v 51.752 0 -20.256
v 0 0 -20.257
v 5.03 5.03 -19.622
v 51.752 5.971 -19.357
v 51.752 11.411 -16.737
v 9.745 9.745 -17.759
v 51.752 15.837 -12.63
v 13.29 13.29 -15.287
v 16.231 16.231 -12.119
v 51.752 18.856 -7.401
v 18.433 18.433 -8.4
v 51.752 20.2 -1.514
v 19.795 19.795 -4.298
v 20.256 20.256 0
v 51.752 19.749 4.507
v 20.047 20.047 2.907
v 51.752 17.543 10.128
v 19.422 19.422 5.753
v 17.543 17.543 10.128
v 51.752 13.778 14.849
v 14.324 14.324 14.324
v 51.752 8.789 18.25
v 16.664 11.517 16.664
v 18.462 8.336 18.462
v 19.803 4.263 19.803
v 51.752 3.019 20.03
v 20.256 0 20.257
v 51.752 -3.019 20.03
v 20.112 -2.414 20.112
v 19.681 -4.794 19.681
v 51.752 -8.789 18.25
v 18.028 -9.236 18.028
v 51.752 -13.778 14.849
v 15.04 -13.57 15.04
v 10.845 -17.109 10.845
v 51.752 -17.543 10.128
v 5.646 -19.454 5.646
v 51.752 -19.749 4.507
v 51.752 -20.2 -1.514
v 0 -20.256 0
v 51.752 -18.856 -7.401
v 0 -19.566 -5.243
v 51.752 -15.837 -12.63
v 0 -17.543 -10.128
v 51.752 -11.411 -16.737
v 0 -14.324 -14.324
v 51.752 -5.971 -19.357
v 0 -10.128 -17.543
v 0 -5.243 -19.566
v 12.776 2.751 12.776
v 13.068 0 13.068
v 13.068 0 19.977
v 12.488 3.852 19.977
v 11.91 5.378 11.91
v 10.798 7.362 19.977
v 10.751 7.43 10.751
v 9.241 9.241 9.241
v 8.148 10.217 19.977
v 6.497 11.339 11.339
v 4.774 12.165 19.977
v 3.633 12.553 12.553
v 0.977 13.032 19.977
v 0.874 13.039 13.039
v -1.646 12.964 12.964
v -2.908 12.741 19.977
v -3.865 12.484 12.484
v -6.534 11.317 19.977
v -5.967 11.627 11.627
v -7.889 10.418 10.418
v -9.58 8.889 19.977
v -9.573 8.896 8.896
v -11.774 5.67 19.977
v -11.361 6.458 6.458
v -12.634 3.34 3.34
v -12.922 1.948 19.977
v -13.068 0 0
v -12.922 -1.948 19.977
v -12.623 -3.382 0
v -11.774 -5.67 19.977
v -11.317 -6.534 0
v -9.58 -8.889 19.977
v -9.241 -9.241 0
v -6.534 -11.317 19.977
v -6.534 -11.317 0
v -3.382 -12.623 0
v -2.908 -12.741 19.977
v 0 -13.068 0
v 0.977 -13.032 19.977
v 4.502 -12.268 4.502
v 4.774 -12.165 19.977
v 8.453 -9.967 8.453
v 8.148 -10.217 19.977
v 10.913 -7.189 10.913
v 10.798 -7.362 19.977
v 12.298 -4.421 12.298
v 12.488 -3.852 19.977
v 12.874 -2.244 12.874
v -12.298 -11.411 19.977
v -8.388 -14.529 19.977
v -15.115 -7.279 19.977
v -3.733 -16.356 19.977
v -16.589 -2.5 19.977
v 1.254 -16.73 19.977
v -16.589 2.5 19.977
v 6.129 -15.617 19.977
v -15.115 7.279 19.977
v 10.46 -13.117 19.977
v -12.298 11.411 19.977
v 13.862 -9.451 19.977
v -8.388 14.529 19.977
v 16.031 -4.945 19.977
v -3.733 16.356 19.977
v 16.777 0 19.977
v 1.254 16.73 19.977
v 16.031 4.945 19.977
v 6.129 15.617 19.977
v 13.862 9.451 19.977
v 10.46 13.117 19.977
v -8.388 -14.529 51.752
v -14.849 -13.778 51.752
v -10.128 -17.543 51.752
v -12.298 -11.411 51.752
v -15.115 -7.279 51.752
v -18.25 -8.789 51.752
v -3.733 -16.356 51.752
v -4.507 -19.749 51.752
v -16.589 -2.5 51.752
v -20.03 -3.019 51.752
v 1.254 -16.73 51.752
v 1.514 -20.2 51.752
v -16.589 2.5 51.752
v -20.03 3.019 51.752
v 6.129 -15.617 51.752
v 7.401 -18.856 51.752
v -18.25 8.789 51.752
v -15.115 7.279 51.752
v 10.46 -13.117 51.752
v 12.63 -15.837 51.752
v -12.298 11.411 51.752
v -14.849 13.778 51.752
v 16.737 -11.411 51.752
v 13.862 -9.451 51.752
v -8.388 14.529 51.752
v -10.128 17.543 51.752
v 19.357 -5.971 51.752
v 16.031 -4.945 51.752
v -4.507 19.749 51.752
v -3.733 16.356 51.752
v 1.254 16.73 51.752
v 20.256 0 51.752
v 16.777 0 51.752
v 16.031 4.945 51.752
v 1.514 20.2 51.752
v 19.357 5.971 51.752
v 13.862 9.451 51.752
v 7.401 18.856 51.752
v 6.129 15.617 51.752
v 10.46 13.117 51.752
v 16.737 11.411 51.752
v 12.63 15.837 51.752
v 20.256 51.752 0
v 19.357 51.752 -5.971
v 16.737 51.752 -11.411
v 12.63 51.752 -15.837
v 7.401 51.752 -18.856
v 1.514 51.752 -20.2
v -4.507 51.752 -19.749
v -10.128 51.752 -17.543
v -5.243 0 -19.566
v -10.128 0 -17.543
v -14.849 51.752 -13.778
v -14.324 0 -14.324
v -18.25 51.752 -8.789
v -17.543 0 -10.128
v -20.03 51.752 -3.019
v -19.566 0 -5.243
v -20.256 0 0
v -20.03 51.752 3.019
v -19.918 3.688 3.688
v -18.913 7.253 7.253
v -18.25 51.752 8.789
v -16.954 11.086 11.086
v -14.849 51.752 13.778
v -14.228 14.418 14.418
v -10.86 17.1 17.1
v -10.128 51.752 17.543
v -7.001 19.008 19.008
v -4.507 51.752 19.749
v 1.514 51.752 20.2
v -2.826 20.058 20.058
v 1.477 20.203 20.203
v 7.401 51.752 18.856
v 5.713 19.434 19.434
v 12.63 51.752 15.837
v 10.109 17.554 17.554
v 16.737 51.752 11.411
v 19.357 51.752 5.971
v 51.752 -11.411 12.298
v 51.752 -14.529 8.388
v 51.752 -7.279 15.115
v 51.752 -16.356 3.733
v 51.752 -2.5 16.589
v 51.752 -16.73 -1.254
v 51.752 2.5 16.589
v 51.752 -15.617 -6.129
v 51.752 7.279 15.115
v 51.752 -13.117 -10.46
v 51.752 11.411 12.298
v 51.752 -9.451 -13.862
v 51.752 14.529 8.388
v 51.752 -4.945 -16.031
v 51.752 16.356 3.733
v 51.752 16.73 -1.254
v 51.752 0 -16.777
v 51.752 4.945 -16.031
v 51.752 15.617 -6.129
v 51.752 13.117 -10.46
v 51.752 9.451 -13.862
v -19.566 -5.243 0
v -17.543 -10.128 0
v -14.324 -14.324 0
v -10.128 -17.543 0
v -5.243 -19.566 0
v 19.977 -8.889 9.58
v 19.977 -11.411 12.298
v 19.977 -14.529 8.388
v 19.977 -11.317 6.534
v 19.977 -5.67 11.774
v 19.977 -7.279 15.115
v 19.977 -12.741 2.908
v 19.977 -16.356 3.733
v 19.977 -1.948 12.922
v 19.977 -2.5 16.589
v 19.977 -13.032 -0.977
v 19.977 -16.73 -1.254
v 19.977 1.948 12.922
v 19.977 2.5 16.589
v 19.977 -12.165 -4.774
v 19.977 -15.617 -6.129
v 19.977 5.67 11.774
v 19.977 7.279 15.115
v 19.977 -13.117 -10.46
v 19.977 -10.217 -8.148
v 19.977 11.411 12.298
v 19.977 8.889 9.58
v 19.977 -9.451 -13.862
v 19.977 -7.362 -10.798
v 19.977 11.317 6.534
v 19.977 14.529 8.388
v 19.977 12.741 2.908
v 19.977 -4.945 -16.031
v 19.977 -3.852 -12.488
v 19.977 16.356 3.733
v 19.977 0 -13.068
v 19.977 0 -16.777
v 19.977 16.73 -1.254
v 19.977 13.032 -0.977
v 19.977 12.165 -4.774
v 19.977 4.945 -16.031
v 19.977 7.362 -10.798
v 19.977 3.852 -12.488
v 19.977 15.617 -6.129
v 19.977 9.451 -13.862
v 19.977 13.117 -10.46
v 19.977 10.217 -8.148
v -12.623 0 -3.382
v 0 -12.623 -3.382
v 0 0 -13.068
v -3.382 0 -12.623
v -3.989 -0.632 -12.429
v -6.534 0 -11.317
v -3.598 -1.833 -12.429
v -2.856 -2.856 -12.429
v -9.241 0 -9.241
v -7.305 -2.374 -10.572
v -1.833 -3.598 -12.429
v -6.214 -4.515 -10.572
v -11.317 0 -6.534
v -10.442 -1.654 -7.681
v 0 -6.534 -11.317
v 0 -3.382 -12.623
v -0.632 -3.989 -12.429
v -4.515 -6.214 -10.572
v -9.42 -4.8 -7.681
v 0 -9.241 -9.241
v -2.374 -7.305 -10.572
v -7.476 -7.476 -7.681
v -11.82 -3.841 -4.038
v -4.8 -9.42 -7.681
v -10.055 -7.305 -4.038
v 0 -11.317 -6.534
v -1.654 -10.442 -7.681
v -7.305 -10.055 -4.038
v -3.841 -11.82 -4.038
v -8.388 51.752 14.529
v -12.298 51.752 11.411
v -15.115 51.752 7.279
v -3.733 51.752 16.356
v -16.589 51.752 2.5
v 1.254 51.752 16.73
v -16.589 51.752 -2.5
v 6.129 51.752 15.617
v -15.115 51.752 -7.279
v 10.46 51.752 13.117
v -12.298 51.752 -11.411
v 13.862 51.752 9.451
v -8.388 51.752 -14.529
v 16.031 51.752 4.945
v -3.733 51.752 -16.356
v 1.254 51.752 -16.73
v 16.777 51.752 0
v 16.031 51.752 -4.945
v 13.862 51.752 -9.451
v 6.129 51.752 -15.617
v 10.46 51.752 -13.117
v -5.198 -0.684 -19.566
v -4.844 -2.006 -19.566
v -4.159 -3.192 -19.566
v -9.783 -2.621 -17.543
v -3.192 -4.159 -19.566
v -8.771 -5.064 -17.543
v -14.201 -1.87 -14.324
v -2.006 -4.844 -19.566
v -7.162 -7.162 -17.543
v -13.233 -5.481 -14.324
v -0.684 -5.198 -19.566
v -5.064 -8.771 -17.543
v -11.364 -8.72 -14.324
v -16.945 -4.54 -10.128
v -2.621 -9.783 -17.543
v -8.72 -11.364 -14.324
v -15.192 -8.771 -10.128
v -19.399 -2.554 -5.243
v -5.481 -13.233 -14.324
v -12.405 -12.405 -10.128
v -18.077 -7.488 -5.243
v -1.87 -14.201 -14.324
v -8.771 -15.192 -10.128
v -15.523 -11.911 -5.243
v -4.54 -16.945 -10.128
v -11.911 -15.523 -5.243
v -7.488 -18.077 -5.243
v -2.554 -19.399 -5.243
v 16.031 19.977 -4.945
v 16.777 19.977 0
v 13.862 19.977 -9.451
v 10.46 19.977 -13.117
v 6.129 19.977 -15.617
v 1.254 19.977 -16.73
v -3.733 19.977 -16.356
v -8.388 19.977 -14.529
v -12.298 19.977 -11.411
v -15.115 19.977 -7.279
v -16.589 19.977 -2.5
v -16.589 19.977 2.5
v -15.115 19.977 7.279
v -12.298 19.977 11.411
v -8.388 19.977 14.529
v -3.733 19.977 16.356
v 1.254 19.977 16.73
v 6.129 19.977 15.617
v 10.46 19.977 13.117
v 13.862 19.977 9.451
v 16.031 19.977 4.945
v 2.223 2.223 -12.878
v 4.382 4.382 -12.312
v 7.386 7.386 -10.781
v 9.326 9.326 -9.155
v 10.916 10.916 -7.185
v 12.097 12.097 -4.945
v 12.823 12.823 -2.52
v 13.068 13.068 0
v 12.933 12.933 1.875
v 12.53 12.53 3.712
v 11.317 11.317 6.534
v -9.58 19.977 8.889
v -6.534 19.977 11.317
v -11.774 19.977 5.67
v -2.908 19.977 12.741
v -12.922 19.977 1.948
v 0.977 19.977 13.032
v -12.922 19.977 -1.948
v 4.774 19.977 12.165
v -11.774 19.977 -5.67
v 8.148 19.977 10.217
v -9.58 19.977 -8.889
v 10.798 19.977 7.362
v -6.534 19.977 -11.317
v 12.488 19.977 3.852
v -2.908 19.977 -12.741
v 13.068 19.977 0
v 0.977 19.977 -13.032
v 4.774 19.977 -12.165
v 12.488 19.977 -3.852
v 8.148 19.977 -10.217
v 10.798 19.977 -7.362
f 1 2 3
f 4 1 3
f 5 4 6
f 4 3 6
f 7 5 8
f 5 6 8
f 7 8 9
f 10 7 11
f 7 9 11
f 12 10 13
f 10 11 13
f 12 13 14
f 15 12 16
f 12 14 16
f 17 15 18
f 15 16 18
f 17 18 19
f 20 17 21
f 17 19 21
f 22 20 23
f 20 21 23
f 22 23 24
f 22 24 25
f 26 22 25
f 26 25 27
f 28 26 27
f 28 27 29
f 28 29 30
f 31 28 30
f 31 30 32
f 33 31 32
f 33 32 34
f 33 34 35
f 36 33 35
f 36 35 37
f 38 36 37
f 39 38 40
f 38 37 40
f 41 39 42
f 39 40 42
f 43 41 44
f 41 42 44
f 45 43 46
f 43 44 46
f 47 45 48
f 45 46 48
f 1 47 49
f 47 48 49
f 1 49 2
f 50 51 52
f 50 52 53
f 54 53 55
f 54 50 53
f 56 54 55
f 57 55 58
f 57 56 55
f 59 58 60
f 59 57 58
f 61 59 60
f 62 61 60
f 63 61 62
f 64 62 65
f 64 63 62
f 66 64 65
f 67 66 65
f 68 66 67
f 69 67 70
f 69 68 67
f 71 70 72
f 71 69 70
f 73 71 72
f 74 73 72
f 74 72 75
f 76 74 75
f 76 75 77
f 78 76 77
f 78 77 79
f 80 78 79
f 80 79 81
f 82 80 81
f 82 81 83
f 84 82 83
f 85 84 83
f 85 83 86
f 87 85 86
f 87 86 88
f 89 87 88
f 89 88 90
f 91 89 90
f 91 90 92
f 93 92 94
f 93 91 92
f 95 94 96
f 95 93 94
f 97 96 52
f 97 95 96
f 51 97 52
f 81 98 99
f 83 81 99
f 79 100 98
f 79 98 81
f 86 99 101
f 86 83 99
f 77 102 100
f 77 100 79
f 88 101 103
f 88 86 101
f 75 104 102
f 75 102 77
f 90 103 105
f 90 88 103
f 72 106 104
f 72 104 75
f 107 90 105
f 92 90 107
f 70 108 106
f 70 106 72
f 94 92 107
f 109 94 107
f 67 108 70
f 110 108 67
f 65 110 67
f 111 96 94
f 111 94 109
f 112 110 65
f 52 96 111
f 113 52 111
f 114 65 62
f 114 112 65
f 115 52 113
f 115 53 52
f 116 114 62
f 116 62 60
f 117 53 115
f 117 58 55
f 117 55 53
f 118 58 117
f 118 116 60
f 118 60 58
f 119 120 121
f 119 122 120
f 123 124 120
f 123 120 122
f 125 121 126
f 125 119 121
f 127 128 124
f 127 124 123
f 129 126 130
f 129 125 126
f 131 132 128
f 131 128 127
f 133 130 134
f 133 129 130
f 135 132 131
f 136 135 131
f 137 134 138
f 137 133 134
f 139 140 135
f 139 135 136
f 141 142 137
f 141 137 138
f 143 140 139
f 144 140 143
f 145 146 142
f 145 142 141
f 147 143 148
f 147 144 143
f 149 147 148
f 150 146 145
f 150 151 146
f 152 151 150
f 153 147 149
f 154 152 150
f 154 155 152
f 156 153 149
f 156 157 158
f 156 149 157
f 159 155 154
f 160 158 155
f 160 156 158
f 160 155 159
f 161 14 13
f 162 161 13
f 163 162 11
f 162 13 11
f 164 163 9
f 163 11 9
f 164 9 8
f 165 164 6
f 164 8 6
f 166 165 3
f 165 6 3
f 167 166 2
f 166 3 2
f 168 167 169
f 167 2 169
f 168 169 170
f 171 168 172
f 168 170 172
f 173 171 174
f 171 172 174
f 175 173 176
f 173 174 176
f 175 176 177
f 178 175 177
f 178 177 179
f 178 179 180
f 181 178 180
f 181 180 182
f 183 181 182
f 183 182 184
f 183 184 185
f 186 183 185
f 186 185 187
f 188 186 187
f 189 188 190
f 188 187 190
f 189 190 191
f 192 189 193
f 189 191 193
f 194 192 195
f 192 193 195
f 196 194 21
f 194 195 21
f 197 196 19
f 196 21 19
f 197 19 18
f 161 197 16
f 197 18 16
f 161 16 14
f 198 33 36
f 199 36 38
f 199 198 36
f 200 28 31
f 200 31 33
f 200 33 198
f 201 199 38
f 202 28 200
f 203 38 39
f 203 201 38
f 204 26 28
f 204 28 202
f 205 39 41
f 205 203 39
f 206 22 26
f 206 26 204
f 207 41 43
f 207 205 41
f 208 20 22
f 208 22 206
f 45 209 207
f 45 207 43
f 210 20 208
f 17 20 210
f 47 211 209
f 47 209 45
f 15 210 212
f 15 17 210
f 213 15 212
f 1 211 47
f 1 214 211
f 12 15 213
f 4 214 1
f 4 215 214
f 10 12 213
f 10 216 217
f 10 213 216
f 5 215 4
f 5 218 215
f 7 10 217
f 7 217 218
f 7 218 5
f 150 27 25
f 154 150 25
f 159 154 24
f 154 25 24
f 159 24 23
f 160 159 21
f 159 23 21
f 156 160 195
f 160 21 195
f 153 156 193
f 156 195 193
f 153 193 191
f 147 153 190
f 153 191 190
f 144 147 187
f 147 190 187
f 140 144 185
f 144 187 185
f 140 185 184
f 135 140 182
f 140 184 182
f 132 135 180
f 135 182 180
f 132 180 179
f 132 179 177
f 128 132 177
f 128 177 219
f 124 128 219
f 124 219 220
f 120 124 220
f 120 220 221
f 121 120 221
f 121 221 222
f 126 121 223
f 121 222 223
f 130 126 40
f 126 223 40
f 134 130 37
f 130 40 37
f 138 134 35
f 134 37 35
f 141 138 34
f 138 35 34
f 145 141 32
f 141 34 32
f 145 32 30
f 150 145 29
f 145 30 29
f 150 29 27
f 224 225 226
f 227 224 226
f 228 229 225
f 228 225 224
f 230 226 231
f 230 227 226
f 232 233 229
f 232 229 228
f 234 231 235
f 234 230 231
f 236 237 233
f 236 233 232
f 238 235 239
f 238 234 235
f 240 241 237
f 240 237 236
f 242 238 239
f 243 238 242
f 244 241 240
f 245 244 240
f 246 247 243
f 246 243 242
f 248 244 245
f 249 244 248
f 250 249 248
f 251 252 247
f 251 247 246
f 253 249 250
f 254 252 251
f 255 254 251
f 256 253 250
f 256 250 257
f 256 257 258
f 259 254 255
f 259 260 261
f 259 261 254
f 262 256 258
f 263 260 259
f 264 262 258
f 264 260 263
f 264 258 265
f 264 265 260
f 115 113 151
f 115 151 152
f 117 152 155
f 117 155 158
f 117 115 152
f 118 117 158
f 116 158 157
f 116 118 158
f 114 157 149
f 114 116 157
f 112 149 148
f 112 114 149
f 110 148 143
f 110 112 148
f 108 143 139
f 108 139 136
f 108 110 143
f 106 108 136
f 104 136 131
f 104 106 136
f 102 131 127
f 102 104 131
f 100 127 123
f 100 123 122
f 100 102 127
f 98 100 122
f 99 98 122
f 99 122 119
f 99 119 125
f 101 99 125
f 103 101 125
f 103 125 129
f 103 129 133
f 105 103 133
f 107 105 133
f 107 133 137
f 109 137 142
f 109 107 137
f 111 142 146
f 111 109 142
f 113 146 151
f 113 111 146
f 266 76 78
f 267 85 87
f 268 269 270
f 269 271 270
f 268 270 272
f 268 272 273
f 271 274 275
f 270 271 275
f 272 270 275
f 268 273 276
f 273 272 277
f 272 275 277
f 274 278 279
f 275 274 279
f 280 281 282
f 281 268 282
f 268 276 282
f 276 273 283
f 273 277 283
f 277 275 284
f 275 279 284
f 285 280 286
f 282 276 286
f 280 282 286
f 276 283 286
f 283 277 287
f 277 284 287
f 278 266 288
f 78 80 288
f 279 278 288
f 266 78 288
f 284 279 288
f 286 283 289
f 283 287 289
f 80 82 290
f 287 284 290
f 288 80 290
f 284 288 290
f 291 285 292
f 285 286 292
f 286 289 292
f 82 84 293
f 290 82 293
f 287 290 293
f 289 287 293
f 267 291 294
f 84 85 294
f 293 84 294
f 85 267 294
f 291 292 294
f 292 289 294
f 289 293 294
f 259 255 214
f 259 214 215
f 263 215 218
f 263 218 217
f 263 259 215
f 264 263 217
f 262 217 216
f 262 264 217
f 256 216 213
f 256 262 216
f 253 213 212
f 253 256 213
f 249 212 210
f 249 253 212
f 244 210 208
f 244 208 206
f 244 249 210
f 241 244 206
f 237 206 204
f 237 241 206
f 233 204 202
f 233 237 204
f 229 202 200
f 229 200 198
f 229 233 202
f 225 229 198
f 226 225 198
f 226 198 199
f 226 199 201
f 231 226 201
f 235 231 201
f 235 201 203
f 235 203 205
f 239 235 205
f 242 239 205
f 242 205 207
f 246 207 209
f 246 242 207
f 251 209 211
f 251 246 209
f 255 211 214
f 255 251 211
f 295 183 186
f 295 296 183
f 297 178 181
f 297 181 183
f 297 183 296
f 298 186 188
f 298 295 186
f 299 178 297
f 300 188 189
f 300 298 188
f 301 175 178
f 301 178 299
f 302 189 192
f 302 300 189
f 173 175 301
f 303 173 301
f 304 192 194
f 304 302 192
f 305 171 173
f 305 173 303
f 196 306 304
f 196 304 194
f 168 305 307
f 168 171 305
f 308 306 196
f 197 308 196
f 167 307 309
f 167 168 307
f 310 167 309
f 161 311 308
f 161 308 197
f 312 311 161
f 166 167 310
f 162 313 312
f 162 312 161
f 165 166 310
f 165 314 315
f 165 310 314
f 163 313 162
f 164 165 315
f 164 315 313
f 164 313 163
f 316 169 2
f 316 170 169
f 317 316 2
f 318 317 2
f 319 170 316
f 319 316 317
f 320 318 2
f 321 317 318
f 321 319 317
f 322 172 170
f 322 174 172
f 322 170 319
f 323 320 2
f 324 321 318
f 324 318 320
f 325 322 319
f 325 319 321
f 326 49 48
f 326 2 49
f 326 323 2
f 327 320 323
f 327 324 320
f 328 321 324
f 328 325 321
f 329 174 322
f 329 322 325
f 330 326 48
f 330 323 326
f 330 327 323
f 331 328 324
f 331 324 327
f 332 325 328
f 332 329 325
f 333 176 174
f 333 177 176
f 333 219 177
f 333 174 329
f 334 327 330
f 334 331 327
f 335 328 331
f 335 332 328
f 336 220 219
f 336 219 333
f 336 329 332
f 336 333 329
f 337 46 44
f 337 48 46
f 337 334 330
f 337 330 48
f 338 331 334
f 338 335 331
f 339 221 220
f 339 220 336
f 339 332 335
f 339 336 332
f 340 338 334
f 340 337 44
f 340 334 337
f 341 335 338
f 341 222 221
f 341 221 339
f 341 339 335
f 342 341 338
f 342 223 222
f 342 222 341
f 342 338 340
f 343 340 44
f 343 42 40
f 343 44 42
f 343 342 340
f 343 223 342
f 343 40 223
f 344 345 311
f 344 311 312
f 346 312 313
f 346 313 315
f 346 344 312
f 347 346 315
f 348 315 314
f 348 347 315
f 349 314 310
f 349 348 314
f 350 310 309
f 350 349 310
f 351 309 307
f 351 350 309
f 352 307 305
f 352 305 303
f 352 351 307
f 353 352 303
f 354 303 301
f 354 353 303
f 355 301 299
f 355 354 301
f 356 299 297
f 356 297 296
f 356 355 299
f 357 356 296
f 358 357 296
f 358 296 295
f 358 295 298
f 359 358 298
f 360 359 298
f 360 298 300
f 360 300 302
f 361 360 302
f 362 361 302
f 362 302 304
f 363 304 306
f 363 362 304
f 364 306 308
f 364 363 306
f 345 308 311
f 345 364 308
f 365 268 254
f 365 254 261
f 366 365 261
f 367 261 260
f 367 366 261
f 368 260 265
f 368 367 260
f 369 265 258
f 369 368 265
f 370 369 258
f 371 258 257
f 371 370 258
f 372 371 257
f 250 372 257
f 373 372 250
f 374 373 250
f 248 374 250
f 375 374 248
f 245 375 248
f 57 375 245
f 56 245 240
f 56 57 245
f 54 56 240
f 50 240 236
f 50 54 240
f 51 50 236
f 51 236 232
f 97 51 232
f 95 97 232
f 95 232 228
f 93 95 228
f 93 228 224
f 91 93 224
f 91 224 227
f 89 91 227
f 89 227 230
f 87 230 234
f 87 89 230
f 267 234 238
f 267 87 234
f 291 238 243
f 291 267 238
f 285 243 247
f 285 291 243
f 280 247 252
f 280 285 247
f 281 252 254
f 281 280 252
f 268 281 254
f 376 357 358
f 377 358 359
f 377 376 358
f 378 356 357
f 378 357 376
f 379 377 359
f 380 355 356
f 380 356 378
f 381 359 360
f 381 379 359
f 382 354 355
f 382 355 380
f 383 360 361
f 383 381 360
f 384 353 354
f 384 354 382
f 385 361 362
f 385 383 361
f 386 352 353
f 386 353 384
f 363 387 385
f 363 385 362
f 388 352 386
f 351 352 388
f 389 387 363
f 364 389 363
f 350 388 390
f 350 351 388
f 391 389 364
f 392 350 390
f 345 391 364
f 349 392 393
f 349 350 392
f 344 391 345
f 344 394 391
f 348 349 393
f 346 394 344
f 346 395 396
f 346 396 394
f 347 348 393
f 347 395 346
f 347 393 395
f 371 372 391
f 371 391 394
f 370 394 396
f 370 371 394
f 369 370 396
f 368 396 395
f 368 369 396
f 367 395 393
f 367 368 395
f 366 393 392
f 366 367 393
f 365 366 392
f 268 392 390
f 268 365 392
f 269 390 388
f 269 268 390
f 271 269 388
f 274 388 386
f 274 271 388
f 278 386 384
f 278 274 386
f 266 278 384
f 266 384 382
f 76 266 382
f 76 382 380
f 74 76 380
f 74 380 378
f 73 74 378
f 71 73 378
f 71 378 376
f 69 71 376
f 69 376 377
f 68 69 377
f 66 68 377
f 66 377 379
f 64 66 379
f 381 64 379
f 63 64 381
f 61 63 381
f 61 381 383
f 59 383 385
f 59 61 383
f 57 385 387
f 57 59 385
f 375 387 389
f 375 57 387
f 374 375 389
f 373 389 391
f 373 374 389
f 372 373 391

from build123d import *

# Parameters (mm, degrees)
YCYNLIDER001_R           = 13.0683
YCYNLIDER001_DEPTH       = 51.7525
YCYNLIDER001_ROLL_ANGLE  = -90
ZCYNLIDER001_R           = 13.0683
ZCYNLIDER001_DEPTH       = 51.7525
XSOCKET_R                = 16.7767
XSOCKET_DEPTH            = 31.7754
XSOCKET_PITCH_ANGLE      = 90
YSOCKET_R                = 16.7767
YSOCKET_DEPTH            = 31.7754
YSOCKET_ROLL_ANGLE       = -90
ZSOCKET_R                = 16.7767
ZSOCKET_DEPTH            = 31.7754
XCYNLIDER001_R           = 13.0683
XCYNLIDER001_DEPTH       = 51.7525
XCYNLIDER001_PITCH_ANGLE = 90
YCYNLIDER_R              = 20.2565
YCYNLIDER_DEPTH          = 51.7525
YCYNLIDER_ROLL_ANGLE     = -90
ZCYNLIDER_R              = 20.2565
ZCYNLIDER_DEPTH          = 51.7525
XCYNLIDER_R              = 20.2565
XCYNLIDER_DEPTH          = 51.7525
XCYNLIDER_PITCH_ANGLE    = 90


with BuildPart() as ycynlider001:
    # YCynlider001 → YCynlider001 (new body)
    with BuildSketch(Plane.XY):
        Circle(YCYNLIDER001_R)
    extrude(amount=YCYNLIDER001_DEPTH)


with BuildPart() as ycynlider001_1:
    # YCynlider001 roll: moved
    add(ycynlider001.part.rotate(Axis((0, 0, 0), (1, 0, 0)), YCYNLIDER001_ROLL_ANGLE))


with BuildPart() as ycynlider001_2:
    # YCynlider001 placement: moved
    add(ycynlider001_1.part)


with BuildPart() as zcynlider001:
    # ZCynlider001 → ZCynlider001 (new body)
    with BuildSketch(Plane.XY):
        Circle(ZCYNLIDER001_R)
    extrude(amount=ZCYNLIDER001_DEPTH)


with BuildPart() as sphere001:
    # Sphere001 → Sphere001 (revolve)
    with BuildSketch(Plane.XZ):
        with BuildLine():
            ThreePointArc((0, -13.0683), (13.0683, 0), (0, 13.0683))
            Line((0, 13.0683), (0, -13.0683))
        make_face()
    revolve(axis=Axis((0, 0, 0), (0, 0, 1)))


with BuildPart() as xsocket:
    # XSocket → XSocket (new body)
    with BuildSketch(Plane.XY):
        Circle(XSOCKET_R)
    extrude(amount=XSOCKET_DEPTH)


with BuildPart() as xsocket_1:
    # XSocket pitch: moved
    add(xsocket.part.rotate(Axis((0, 0, 0), (0, 1, 0)), XSOCKET_PITCH_ANGLE))


with BuildPart() as xsocket_2:
    # XSocket placement: moved
    add(xsocket_1.part.moved(Location((19.9771, 0, 0))))


with BuildPart() as ysocket:
    # YSocket → YSocket (new body)
    with BuildSketch(Plane.XY):
        Circle(YSOCKET_R)
    extrude(amount=YSOCKET_DEPTH)


with BuildPart() as ysocket_1:
    # YSocket roll: moved
    add(ysocket.part.rotate(Axis((0, 0, 0), (1, 0, 0)), YSOCKET_ROLL_ANGLE))


with BuildPart() as ysocket_2:
    # YSocket placement: moved
    add(ysocket_1.part.moved(Location((0, 19.9771, 0))))


with BuildPart() as zsocket:
    # ZSocket → ZSocket (new body)
    with BuildSketch(Plane.XY.offset(19.9771)):
        Circle(ZSOCKET_R)
    extrude(amount=ZSOCKET_DEPTH)


with BuildPart() as fusion001:
    # XCynlider001 → XCynlider001 (new body)
    with BuildSketch(Plane.XY):
        Circle(XCYNLIDER001_R)
    extrude(amount=XCYNLIDER001_DEPTH)


with BuildPart() as fusion001_1:
    # XCynlider001 pitch: moved
    add(fusion001.part.rotate(Axis((0, 0, 0), (0, 1, 0)), XCYNLIDER001_PITCH_ANGLE))


with BuildPart() as fusion001_2:
    # XCynlider001 placement: moved
    add(fusion001_1.part)

    # Fusion001: union YCynlider001, ZCynlider001, Sphere001, XSocket, YSocket, ZSocket
    add(ycynlider001_2.part)
    add(zcynlider001.part)
    add(sphere001.part)
    add(xsocket_2.part)
    add(ysocket_2.part)
    add(zsocket.part)


with BuildPart() as ycynlider:
    # YCynlider → YCynlider (new body)
    with BuildSketch(Plane.XY):
        Circle(YCYNLIDER_R)
    extrude(amount=YCYNLIDER_DEPTH)


with BuildPart() as ycynlider_1:
    # YCynlider roll: moved
    add(ycynlider.part.rotate(Axis((0, 0, 0), (1, 0, 0)), YCYNLIDER_ROLL_ANGLE))


with BuildPart() as ycynlider_2:
    # YCynlider placement: moved
    add(ycynlider_1.part)


with BuildPart() as zcynlider:
    # ZCynlider → ZCynlider (new body)
    with BuildSketch(Plane.XY):
        Circle(ZCYNLIDER_R)
    extrude(amount=ZCYNLIDER_DEPTH)


with BuildPart() as sphere:
    # Sphere → Sphere (revolve)
    with BuildSketch(Plane.XZ):
        with BuildLine():
            ThreePointArc((0, -20.2565), (20.2565, 0), (0, 20.2565))
            Line((0, 20.2565), (0, -20.2565))
        make_face()
    revolve(axis=Axis((0, 0, 0), (0, 0, 1)))


with BuildPart() as f0013we:
    # XCynlider → XCynlider (new body)
    with BuildSketch(Plane.XY):
        Circle(XCYNLIDER_R)
    extrude(amount=XCYNLIDER_DEPTH)


with BuildPart() as f0013we_1:
    # XCynlider pitch: moved
    add(f0013we.part.rotate(Axis((0, 0, 0), (0, 1, 0)), XCYNLIDER_PITCH_ANGLE))


with BuildPart() as f0013we_2:
    # XCynlider placement: moved
    add(f0013we_1.part)

    # Fusion: union YCynlider, ZCynlider, Sphere
    add(ycynlider_2.part)
    add(zcynlider.part)
    add(sphere.part)

    # Cut: cut Fusion001
    add(fusion001_2.part, mode=Mode.SUBTRACT)


solid = f0013we_2.part
